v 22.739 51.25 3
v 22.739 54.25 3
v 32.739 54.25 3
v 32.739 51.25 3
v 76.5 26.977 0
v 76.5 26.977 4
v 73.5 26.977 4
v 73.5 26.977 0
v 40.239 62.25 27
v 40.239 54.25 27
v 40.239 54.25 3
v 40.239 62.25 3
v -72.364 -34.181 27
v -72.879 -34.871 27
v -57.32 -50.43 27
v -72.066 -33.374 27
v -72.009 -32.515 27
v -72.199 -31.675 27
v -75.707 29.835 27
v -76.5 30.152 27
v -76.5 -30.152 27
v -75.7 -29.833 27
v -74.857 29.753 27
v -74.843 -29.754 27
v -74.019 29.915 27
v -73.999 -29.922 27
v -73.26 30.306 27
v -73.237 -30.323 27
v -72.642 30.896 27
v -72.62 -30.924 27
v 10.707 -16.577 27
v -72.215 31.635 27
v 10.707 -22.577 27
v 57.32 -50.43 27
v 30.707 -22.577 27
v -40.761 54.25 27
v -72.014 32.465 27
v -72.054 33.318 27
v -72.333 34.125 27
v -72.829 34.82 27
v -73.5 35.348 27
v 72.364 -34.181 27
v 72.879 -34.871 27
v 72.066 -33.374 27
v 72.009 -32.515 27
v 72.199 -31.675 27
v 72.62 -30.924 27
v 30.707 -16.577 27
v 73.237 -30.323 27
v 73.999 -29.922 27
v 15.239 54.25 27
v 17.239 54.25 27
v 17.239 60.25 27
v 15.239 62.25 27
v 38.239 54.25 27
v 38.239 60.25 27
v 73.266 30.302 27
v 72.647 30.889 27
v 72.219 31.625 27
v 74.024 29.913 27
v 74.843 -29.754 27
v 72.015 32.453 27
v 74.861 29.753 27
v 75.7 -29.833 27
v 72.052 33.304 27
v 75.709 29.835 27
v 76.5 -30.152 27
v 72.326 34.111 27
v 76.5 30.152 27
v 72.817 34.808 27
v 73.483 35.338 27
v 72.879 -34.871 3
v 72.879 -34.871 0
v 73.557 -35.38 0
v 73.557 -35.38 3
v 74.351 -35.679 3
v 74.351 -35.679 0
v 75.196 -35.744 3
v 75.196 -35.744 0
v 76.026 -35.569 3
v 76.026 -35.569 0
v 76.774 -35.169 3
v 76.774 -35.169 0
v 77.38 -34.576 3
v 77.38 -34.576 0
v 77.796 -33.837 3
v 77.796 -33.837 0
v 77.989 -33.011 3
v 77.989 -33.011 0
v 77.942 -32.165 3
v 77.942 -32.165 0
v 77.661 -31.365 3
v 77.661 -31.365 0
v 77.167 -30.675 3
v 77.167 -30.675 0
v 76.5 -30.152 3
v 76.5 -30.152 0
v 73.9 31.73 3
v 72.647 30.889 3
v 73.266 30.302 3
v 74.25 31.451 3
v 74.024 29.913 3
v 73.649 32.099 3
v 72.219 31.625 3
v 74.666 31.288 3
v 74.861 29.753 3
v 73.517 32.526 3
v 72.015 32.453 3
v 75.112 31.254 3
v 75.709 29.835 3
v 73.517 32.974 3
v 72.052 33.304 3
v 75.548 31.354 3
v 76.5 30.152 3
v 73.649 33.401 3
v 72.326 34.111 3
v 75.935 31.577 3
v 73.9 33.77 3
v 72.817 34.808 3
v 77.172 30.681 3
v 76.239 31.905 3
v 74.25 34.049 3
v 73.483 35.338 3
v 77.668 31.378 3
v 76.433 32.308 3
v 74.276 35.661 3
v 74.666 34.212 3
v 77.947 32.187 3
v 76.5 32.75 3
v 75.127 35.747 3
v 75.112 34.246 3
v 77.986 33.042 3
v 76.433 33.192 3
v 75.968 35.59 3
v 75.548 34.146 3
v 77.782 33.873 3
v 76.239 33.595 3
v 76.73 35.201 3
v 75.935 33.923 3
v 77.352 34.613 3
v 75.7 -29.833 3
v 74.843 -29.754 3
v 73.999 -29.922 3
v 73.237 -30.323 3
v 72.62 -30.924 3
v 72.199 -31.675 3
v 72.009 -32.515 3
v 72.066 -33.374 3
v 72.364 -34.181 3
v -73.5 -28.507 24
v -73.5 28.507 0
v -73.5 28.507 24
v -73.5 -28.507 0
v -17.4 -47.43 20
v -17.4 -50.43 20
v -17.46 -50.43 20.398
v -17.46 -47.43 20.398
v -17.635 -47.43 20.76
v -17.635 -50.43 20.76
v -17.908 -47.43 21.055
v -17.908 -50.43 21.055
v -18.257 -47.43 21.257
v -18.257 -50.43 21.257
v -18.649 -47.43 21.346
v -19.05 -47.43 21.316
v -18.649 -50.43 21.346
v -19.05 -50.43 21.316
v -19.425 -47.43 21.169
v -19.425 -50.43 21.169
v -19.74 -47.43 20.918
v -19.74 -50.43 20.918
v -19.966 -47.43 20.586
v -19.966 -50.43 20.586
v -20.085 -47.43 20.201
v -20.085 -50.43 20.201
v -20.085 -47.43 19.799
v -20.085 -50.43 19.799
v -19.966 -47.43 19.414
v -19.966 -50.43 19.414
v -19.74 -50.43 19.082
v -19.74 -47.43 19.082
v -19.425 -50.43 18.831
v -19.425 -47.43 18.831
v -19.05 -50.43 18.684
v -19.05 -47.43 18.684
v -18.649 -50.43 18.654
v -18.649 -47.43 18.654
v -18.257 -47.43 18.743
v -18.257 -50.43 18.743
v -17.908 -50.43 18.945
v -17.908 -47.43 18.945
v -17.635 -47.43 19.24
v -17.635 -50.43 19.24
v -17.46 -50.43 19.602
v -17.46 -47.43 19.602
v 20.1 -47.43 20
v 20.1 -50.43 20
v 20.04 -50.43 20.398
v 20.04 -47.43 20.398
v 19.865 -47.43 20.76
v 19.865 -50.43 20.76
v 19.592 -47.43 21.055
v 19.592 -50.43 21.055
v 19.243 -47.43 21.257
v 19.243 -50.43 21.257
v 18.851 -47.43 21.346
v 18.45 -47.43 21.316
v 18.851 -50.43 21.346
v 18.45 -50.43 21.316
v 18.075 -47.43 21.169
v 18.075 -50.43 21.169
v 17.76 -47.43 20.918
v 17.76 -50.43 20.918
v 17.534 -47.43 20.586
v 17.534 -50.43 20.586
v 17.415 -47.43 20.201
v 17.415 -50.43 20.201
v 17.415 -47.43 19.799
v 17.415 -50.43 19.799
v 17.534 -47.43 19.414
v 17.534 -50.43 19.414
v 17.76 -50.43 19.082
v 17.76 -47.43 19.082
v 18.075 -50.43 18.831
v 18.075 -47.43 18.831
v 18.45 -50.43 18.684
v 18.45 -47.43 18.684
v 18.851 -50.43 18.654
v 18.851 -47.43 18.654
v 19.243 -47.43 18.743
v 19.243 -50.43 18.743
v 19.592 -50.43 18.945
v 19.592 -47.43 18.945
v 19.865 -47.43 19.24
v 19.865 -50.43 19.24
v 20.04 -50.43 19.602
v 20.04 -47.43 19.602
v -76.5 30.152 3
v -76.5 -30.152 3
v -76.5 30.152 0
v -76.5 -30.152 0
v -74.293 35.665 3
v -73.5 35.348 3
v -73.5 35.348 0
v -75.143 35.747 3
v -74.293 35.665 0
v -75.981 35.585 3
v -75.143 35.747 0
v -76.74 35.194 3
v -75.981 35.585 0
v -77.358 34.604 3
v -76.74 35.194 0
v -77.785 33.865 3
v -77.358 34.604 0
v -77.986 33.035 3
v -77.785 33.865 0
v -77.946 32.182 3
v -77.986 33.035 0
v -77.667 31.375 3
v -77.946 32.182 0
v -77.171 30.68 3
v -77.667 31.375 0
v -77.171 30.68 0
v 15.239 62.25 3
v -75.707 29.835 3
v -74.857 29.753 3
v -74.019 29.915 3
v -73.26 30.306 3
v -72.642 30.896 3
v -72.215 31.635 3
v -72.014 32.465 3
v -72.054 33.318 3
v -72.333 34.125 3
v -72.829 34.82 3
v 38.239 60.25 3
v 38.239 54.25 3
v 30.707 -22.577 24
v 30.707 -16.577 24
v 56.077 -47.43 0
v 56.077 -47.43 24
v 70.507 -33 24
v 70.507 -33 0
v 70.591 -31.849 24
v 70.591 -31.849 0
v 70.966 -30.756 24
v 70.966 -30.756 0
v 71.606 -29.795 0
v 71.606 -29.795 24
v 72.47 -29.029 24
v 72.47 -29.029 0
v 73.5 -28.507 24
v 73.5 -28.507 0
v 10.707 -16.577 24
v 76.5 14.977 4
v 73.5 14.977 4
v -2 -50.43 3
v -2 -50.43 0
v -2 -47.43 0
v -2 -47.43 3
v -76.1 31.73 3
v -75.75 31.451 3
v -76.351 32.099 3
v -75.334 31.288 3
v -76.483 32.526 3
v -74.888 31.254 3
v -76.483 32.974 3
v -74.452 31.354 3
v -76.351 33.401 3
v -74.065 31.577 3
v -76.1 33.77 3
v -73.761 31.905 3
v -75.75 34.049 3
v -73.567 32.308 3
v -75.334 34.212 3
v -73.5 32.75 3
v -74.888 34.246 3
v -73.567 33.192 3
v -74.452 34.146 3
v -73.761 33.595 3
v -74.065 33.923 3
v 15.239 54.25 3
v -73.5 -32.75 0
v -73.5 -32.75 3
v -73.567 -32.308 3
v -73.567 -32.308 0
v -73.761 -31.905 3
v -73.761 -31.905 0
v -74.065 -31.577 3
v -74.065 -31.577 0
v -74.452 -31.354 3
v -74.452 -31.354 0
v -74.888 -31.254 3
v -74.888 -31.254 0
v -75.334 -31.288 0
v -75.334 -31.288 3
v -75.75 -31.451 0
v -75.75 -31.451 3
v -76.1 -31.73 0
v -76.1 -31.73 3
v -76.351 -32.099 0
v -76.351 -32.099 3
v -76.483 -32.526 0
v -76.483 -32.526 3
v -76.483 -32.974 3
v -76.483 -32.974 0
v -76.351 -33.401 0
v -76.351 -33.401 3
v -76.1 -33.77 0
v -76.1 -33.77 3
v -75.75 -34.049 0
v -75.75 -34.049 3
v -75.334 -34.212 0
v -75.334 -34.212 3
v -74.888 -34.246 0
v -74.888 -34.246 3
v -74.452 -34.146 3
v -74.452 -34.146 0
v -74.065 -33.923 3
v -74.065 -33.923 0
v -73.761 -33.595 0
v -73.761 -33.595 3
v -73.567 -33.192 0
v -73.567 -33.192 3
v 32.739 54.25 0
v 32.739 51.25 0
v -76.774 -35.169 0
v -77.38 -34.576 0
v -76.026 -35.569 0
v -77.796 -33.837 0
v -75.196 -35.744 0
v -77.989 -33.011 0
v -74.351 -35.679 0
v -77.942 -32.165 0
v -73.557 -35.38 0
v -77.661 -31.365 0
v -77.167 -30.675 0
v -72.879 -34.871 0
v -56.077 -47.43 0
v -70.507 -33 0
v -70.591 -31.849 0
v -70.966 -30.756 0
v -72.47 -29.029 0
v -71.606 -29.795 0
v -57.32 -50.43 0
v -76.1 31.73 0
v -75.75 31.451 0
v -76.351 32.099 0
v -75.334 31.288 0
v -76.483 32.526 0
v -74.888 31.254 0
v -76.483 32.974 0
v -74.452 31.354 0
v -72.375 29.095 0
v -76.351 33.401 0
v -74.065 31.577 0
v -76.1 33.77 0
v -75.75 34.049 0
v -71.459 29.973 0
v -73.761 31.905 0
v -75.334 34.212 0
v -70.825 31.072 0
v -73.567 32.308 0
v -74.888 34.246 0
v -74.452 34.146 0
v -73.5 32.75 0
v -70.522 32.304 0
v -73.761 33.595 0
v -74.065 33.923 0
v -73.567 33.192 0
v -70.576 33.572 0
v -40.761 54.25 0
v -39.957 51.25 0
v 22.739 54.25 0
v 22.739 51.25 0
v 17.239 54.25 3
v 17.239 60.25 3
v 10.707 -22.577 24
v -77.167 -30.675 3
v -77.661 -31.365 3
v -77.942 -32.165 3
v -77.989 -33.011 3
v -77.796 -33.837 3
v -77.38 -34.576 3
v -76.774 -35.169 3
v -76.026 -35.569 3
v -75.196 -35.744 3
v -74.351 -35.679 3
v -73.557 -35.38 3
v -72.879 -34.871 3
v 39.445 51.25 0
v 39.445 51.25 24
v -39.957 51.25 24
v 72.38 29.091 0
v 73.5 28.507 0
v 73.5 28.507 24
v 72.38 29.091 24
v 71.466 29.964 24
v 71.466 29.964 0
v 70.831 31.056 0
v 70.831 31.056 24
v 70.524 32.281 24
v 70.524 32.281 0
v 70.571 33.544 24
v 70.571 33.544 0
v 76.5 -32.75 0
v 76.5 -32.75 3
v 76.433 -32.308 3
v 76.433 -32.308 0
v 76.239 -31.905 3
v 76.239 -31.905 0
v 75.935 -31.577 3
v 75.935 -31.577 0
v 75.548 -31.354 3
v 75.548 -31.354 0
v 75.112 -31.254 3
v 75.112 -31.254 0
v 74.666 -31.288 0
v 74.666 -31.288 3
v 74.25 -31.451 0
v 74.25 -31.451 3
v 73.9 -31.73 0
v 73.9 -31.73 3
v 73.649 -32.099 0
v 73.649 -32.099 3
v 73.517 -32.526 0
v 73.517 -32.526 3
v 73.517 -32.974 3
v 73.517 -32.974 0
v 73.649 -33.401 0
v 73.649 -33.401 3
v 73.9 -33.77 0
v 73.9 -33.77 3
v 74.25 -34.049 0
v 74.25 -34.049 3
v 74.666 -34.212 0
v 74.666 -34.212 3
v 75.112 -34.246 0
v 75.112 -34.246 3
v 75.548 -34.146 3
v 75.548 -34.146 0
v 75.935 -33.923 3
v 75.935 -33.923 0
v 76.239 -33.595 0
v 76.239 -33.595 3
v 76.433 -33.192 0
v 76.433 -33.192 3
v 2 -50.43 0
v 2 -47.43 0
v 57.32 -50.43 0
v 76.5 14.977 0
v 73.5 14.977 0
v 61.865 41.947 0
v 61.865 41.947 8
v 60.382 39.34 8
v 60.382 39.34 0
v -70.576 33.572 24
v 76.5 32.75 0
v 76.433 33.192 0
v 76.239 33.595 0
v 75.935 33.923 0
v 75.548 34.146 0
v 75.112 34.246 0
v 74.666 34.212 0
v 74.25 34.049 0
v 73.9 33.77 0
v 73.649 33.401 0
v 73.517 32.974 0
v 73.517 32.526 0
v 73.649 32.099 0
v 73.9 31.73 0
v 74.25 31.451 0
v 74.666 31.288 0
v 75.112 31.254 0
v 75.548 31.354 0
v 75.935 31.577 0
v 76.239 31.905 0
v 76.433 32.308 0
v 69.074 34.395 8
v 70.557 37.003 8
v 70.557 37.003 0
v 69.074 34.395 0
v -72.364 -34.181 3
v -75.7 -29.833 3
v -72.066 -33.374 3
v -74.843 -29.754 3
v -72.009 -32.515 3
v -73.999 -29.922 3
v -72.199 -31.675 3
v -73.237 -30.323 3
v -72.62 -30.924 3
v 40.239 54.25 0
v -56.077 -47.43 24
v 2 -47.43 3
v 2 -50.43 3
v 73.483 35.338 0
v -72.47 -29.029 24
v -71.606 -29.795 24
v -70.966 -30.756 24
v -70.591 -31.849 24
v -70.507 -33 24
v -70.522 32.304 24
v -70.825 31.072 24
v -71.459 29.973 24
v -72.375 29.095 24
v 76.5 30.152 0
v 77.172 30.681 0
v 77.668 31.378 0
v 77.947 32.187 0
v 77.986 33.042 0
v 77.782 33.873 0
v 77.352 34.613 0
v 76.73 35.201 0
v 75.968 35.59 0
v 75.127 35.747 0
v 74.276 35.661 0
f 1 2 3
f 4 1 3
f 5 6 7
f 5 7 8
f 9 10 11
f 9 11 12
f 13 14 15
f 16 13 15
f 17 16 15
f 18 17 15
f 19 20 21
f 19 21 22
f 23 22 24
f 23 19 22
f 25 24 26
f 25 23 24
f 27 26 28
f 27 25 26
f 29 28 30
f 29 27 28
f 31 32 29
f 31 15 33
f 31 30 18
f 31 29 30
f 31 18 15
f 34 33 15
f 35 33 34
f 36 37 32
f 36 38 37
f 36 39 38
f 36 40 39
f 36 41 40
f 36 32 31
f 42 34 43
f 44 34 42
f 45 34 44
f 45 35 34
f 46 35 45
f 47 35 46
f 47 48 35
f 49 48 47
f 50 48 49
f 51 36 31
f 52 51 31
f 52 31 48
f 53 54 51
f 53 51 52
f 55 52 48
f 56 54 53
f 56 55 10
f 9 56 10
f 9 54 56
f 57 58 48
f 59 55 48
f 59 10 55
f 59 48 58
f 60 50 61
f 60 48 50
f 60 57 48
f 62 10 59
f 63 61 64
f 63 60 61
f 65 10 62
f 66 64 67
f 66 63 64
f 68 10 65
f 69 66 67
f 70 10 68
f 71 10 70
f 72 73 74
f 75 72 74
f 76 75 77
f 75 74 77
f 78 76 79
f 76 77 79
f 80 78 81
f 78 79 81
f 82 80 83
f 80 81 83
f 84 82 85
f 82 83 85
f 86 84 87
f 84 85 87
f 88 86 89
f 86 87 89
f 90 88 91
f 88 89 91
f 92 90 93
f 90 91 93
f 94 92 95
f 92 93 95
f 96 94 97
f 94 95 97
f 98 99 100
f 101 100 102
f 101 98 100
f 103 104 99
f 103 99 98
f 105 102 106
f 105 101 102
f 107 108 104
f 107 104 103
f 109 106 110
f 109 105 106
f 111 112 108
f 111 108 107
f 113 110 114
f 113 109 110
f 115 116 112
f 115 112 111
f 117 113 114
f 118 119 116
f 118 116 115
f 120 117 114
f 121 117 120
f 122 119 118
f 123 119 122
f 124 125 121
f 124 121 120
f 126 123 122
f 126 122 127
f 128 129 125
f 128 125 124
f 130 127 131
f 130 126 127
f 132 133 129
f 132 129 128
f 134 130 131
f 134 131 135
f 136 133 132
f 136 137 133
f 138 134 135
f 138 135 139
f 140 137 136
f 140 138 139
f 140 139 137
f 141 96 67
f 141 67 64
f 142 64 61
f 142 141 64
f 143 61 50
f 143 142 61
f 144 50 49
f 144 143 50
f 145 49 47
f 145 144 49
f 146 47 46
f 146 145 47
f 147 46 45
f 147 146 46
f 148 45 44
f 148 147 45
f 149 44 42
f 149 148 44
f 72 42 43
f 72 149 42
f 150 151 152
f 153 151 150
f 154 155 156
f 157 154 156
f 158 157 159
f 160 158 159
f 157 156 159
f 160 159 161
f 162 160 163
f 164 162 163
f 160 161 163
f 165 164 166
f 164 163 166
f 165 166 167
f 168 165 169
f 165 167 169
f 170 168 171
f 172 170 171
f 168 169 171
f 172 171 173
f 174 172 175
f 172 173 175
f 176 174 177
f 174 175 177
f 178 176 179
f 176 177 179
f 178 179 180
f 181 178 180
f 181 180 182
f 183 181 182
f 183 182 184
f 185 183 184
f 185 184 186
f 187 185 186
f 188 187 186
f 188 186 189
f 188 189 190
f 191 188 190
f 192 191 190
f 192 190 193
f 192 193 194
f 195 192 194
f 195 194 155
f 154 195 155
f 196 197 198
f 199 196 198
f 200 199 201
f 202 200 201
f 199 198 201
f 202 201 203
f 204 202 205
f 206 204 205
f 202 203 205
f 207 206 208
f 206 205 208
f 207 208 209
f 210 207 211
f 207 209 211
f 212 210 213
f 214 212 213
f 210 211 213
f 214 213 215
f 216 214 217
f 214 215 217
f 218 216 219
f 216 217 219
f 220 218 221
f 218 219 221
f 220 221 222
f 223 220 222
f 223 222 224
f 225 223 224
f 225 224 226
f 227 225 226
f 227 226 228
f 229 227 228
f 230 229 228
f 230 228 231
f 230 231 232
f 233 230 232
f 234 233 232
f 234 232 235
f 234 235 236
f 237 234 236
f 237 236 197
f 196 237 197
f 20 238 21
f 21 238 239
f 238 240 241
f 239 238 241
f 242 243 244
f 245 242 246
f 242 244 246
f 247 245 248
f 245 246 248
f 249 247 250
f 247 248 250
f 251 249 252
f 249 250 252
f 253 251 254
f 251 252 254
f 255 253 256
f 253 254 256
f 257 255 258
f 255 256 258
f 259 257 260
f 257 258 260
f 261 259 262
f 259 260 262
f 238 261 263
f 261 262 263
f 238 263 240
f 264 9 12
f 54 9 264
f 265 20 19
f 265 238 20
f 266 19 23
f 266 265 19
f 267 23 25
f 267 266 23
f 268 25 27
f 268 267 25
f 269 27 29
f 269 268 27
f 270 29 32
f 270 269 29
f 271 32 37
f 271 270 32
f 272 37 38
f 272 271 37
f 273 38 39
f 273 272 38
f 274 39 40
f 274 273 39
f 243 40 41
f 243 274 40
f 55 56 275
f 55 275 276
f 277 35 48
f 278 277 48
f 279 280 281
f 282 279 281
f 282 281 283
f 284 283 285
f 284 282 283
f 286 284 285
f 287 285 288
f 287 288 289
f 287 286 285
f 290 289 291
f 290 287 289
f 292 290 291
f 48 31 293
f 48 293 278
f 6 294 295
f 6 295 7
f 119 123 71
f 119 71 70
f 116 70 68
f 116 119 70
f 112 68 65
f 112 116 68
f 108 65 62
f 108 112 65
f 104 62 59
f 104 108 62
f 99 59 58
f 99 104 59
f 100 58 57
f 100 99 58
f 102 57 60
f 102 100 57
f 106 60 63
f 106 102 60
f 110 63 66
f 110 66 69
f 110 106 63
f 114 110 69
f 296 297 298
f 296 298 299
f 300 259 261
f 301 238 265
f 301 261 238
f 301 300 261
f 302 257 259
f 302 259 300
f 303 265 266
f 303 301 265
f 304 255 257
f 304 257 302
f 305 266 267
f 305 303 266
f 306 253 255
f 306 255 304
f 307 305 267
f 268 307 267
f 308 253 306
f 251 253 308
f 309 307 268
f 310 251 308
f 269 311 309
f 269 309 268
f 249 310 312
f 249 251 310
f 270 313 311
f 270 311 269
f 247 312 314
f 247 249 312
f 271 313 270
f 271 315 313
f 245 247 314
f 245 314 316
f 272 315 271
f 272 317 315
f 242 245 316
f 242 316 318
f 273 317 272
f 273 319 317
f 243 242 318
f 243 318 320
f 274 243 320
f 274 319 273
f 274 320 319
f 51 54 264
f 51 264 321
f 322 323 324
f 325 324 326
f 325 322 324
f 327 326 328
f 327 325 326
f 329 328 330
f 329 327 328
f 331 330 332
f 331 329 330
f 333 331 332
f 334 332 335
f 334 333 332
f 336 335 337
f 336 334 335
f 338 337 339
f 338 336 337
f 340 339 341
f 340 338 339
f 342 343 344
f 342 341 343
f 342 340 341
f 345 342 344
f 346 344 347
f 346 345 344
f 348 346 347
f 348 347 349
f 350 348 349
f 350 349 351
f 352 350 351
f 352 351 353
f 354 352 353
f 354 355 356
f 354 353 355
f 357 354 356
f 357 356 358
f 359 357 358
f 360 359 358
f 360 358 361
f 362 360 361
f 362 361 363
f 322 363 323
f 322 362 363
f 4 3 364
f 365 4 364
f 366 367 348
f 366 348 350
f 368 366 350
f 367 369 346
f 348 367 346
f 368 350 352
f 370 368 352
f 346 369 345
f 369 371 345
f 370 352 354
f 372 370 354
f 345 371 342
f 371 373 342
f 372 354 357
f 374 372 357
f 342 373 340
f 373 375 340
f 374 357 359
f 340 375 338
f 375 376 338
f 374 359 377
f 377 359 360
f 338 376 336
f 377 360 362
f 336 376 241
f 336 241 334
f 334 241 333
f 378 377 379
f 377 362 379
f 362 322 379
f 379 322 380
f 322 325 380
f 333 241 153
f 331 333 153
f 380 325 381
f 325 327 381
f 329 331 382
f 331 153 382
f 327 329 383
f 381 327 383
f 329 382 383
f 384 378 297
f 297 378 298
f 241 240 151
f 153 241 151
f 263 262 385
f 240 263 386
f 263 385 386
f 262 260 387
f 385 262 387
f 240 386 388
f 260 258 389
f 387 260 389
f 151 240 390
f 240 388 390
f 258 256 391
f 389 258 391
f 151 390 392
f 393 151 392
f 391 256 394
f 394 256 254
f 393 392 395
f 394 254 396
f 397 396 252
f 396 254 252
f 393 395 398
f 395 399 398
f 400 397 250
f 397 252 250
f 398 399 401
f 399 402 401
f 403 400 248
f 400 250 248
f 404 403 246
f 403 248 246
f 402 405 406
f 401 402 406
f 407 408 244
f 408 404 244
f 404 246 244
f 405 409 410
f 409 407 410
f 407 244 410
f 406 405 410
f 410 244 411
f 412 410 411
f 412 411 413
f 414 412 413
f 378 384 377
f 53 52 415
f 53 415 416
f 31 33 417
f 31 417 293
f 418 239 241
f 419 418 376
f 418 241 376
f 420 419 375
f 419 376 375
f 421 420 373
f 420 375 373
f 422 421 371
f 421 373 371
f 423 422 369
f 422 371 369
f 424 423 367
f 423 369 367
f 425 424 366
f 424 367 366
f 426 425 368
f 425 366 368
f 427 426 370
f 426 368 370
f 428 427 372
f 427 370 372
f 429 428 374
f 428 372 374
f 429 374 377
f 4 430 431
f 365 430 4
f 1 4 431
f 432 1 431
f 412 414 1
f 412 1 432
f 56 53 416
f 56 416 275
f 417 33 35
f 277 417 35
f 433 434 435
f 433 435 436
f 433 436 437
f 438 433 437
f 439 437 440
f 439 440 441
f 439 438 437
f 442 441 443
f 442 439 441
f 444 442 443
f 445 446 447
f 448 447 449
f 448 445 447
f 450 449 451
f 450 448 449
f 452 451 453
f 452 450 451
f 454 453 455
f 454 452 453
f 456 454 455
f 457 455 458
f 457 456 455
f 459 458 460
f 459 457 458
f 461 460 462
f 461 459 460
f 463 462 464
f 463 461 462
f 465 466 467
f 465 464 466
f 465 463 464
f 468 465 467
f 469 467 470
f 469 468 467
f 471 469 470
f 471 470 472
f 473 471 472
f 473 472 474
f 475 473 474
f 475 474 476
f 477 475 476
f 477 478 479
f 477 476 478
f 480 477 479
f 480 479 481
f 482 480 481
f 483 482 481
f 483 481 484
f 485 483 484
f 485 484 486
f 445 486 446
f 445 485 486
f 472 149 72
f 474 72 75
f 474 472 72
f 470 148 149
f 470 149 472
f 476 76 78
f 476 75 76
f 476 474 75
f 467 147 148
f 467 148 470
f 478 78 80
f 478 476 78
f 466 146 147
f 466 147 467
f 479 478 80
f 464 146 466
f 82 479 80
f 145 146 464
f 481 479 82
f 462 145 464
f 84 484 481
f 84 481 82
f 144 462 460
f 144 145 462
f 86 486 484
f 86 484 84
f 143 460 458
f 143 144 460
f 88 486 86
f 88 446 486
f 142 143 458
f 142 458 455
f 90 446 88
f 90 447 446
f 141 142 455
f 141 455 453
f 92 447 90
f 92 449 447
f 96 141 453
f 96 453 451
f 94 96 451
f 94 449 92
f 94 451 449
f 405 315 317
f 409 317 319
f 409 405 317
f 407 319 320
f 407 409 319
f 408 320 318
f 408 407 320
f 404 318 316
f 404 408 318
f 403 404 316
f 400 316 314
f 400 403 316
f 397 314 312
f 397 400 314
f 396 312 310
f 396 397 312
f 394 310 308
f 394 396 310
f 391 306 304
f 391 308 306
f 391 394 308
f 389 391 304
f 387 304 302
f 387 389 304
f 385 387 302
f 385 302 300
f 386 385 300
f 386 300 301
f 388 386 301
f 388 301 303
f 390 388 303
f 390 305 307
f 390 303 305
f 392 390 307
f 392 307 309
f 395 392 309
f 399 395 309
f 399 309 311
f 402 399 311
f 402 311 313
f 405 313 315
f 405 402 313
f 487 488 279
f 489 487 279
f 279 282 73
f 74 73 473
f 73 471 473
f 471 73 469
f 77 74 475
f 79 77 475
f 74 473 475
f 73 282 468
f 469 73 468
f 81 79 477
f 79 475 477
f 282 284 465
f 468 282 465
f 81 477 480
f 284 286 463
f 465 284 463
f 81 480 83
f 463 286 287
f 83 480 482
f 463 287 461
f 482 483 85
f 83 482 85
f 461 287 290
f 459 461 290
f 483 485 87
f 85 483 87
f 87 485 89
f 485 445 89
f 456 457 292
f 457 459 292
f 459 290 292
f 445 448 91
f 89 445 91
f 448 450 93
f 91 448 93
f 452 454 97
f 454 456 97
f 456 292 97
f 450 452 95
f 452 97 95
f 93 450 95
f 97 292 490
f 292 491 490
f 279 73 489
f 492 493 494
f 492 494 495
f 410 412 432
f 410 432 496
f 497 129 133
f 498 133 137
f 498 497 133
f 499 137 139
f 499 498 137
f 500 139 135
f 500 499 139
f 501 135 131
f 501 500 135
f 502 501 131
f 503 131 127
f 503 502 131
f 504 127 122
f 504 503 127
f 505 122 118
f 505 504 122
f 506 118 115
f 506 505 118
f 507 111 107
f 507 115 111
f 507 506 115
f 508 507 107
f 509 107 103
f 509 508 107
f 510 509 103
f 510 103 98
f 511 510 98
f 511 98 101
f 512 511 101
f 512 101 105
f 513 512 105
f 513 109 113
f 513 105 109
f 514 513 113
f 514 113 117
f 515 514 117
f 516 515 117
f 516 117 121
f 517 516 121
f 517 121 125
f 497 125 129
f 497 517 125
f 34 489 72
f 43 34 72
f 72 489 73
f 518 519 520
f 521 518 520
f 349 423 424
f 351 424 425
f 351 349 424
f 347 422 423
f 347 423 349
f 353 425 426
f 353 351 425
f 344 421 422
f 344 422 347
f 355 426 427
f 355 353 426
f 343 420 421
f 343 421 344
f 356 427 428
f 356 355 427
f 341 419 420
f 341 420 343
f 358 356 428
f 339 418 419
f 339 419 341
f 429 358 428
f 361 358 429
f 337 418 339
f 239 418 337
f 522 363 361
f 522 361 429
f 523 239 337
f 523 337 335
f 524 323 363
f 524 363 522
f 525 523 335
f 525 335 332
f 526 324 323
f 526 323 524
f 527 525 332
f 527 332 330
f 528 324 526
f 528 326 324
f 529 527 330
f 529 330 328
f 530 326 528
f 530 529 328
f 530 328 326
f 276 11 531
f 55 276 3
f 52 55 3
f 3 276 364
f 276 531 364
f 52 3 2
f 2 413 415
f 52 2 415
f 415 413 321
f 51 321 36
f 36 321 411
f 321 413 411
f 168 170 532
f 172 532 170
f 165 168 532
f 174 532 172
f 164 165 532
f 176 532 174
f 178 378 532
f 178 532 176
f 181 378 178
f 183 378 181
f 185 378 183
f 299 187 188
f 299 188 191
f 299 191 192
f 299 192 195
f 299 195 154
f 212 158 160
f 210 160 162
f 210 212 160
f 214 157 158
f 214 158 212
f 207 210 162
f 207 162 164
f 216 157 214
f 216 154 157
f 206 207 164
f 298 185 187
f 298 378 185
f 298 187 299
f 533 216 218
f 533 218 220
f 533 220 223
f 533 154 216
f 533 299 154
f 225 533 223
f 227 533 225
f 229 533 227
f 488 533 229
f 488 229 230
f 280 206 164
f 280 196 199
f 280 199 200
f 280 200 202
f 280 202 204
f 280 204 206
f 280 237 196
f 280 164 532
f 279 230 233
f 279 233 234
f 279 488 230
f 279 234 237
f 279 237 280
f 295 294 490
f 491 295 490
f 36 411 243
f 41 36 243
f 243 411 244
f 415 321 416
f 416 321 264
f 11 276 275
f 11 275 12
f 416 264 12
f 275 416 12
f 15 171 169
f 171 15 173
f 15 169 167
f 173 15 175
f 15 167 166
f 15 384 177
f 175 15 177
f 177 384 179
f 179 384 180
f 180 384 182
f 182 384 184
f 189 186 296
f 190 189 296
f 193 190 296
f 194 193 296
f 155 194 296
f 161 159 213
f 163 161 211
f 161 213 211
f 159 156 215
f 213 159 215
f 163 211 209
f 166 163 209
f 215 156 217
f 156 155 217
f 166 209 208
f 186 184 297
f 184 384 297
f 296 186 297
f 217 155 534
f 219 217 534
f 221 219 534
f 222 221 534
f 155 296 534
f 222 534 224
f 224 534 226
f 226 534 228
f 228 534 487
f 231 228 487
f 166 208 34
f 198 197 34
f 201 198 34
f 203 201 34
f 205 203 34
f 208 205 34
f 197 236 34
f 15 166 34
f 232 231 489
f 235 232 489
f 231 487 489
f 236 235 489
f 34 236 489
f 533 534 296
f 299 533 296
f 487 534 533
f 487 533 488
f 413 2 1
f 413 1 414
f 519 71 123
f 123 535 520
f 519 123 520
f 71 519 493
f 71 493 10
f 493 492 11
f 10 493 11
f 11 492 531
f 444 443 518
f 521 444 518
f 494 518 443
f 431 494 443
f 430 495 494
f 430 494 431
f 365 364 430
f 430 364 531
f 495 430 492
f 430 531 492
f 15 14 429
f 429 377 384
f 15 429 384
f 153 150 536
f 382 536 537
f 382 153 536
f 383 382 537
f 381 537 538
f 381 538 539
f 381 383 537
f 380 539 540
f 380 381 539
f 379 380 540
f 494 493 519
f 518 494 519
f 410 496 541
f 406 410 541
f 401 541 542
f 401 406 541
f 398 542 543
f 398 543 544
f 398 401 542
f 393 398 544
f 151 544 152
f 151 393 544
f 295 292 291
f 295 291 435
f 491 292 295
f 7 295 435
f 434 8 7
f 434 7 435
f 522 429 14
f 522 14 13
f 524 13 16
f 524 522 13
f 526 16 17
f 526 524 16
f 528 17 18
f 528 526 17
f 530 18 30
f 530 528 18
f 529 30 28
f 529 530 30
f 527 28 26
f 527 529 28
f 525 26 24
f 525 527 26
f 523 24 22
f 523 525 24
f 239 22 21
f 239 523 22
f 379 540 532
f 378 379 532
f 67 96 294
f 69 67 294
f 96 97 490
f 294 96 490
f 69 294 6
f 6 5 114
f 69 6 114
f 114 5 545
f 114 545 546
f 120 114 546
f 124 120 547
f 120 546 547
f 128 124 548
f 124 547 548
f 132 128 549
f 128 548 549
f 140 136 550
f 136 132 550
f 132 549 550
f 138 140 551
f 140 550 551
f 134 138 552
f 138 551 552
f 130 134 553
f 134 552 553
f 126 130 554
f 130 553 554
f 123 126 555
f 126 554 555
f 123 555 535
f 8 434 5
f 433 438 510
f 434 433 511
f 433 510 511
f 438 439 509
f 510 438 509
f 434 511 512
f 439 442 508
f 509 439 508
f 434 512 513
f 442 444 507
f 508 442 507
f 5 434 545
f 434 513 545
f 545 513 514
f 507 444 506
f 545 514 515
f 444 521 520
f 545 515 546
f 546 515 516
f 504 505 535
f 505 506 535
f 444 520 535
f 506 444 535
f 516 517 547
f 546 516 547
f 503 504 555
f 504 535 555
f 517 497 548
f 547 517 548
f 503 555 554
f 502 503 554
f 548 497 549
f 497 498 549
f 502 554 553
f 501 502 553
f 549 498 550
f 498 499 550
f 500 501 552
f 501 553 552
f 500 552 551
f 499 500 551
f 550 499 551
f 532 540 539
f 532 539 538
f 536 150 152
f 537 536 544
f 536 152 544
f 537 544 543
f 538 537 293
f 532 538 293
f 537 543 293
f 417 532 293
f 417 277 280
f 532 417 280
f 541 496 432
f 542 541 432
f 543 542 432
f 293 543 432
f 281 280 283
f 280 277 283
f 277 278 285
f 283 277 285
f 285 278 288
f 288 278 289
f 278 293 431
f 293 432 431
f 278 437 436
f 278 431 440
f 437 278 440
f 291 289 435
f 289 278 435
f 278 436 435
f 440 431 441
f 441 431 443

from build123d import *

# Parameters (mm, degrees)
SKETCH_2_R          = 1.5
EXTRUDE_1_DEPTH     = 27
SHELL_1_DEPTH       = 24
CUT_EXTRUDE_START   = -24
SKETCH_3_R          = 3
CUT_EXTRUDE_1_DEPTH = 24
SKETCH_5_W          = 20
SKETCH_5_H          = 6
CUT_EXTRUDE_3_DEPTH = 32
SKETCH_6_W          = 4
SKETCH_6_H          = 12
CUT_EXTRUDE_4_DEPTH = 32
SKETCH_7_W          = 10
SKETCH_7_H          = 8
CUT_EXTRUDE_5_DEPTH = 32
EXTRUDE_2_DEPTH     = 24
SKETCH_9_W          = 10
SKETCH_9_H          = 3
CUT_EXTRUDE_6_DEPTH = 24
SKETCH_10_R         = 1.35
CUT_EXTRUDE_7_DEPTH = 10
CUT_EXTRUDE_8_DEPTH = 10


# Read off the part's stored shape, not the designer's step: 抽壳1
with BuildPart() as part:
    # 草图2 → 凸台-拉伸1 (new body)
    with BuildSketch(Plane.XY):
        with BuildLine():
            Line((-76.5, 30.151923789), (-76.5, -30.151923789))
            ThreePointArc((-76.5, -30.151923789), (-77.380060021, -34.576284287), (-72.878679656, -34.871320344))
            Line((-72.878679656, -34.871320344), (-57.32, -50.43))
            Line((-57.32, -50.43), (57.32, -50.43))
            Line((57.32, -50.43), (72.878679656, -34.871320344))
            ThreePointArc((72.878679656, -34.871320344), (77.380060021, -34.576284287), (76.5, -30.151923789))
            Line((76.5, -30.151923789), (76.5, 30.151923789))
            ThreePointArc((76.5, 30.151923789), (77.593259199, 34.258312544), (73.483390382, 35.33841559))
            Line((73.483390382, 35.33841559), (40.238526366, 54.25))
            Line((40.238526366, 54.25), (-40.760907637, 54.25))
            Line((-40.760907637, 54.25), (-73.5, 35.348076211))
            ThreePointArc((-73.5, 35.348076211), (-77.598076211, 34.25), (-76.5, 30.151923789))
        make_face()
        with Locations((-75, 32.75)):
            Circle(SKETCH_2_R, mode=Mode.SUBTRACT)
        with Locations((75, 32.75)):
            Circle(SKETCH_2_R, mode=Mode.SUBTRACT)
        with Locations((75, -32.75)):
            Circle(SKETCH_2_R, mode=Mode.SUBTRACT)
        with Locations((-75, -32.75)):
            Circle(SKETCH_2_R, mode=Mode.SUBTRACT)
    extrude(amount=EXTRUDE_1_DEPTH)

    # 抽壳1 outline → 抽壳1 (cut)
    with BuildSketch(Plane.XY):
        with BuildLine():
            Line((-73.5, 28.507359313), (-73.5, -28.507359313))
            ThreePointArc((-73.5, -28.507359313), (-71.254879923, -30.255190266), (-70.506971411, -33.000387902))
            Line((-70.506971411, -33.000387902), (-56.077359313, -47.43))
            Line((-56.077359313, -47.43), (56.077359313, -47.43))
            Line((56.077359313, -47.43), (70.506971411, -33.000387902))
            ThreePointArc((70.506971411, -33.000387902), (71.254879923, -30.255190266), (73.5, -28.507359313))
            Line((73.5, -28.507359313), (73.5, 28.507359313))
            ThreePointArc((73.5, 28.507359313), (71.110106029, 30.48754008), (70.570593139, 33.543948905))
            Line((70.570593139, 33.543948905), (39.444948236, 51.25))
            Line((39.444948236, 51.25), (-39.95706006, 51.25))
            Line((-39.95706006, 51.25), (-70.575765386, 33.572282238))
            ThreePointArc((-70.575765386, 33.572282238), (-71.102885683, 30.5), (-73.5, 28.507359313))
        make_face()
    extrude(amount=SHELL_1_DEPTH, mode=Mode.SUBTRACT)

    # 草图3 → 切除-拉伸1 (cut)
    with BuildSketch(Plane.XY.offset(27).offset(CUT_EXTRUDE_START)):
        with Locations((75, 32.75)):
            Circle(SKETCH_3_R)
        with Locations((75, -32.75)):
            Circle(SKETCH_3_R)
        with Locations((-75, -32.75)):
            Circle(SKETCH_3_R)
        with Locations((-75, 32.75)):
            Circle(SKETCH_3_R)
    extrude(amount=CUT_EXTRUDE_1_DEPTH, mode=Mode.SUBTRACT)

    # 草图5 → 切除-拉伸3 (cut)
    with BuildSketch(Plane.XY.offset(27)):
        with Locations((20.7074416, -19.577067137)):
            Rectangle(SKETCH_5_W, SKETCH_5_H)
    extrude(amount=-CUT_EXTRUDE_3_DEPTH, mode=Mode.SUBTRACT)

    # 草图6 → 切除-拉伸4 (cut)
    with BuildSketch(Plane(origin=(76.5, 0, 0), x_dir=(0, 0, -1), z_dir=(1, 0, 0))):
        with Locations((-2, 20.977362477)):
            Rectangle(SKETCH_6_W, SKETCH_6_H)
    extrude(amount=-CUT_EXTRUDE_4_DEPTH, mode=Mode.SUBTRACT)

    # 草图7 → 切除-拉伸5 (cut)
    with BuildSketch(Plane(origin=(33.153284591, 58.280491682, 0), x_dir=(0.8692042501767389, -0.4944532045347601, 0), z_dir=(0.4944532045347601, 0.8692042501767389, 0))):
        with Locations((38.03253292, -4)):
            Rectangle(SKETCH_7_W, SKETCH_7_H)
    extrude(amount=-CUT_EXTRUDE_5_DEPTH, mode=Mode.SUBTRACT)

    # 草图8 → 凸台-拉伸2 (add)
    with BuildSketch(Plane.XY.offset(27)):
        Polygon((40.238526366, 54.25), (40.238526366, 62.25), (15.238526366, 62.25), (15.238526366, 54.25), (17.238526366, 54.25), (17.238526366, 60.25), (38.238526366, 60.25), (38.238526366, 54.25), align=None)
    extrude(amount=-EXTRUDE_2_DEPTH)

    # 草图9 → 切除-拉伸6 (cut)
    with BuildSketch(Plane(origin=(0, 54.25, 0), x_dir=(1, 0, 0), z_dir=(0, 1, 0))):
        with Locations((27.738526366, -1.5)):
            Rectangle(SKETCH_9_W, SKETCH_9_H)
    extrude(amount=-CUT_EXTRUDE_6_DEPTH, mode=Mode.SUBTRACT)

    # 草图10 → 切除-拉伸7 (cut)
    with BuildSketch(Plane.XZ.offset(50.43)):
        with Locations((-18.75, 20)):
            Circle(SKETCH_10_R)
        with Locations((18.75, 20)):
            Circle(SKETCH_10_R)
    extrude(amount=-CUT_EXTRUDE_7_DEPTH, mode=Mode.SUBTRACT)

    # 草图11 → 切除-拉伸8 (cut)
    with BuildSketch(Plane.XZ.offset(50.43)):
        Polygon((0, 3), (2, 3), (2, 0), (-2, 0), (-2, 3), align=None)
    extrude(amount=-CUT_EXTRUDE_8_DEPTH, mode=Mode.SUBTRACT)


solid = part.part
